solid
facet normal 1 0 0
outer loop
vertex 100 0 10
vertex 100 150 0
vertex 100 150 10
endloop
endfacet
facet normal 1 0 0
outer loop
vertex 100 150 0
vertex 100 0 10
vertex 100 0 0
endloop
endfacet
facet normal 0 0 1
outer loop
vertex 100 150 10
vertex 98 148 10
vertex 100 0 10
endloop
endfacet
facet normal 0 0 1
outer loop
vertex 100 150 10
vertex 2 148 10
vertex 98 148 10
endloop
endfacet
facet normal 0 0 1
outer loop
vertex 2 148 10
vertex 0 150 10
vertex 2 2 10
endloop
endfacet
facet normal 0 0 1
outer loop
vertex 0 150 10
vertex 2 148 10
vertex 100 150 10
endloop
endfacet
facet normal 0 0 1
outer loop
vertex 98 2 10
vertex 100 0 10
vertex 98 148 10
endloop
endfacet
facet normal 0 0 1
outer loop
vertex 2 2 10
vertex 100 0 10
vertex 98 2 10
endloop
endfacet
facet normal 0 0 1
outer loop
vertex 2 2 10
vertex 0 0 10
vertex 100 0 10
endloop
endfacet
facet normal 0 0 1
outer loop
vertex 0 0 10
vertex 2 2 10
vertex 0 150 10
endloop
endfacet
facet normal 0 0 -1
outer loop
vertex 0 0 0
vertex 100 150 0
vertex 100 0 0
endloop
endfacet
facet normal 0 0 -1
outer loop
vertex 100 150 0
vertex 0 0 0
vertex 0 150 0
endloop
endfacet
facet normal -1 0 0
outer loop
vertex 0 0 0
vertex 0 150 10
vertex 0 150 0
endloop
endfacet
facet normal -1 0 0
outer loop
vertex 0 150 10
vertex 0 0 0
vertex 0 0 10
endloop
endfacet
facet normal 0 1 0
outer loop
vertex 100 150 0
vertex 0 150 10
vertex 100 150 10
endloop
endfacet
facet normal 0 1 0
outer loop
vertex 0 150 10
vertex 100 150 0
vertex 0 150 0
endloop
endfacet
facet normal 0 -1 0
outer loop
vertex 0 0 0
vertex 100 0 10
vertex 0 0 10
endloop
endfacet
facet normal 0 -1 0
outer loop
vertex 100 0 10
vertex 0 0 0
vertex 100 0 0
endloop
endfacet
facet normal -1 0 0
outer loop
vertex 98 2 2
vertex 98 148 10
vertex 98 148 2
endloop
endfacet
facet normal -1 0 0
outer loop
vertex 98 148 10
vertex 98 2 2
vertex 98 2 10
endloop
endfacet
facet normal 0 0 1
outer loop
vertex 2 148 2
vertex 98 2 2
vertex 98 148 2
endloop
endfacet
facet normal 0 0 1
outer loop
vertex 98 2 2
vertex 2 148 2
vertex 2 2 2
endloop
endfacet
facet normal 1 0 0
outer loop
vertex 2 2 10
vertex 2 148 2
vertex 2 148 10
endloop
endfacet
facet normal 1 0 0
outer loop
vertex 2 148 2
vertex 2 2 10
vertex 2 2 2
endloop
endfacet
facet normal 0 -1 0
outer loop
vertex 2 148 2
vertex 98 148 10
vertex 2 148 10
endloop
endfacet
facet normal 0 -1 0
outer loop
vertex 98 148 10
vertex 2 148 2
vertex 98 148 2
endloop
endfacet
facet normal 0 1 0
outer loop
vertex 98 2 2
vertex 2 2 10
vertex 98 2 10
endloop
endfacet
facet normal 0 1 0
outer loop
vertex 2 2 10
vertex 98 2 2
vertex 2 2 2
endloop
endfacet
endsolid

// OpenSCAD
l = 100;
w = 150;
h = 10;
s = 2;


difference() {
    cube([l,w,h]);
    translate([s,s,s]) cube([l-2*s,w-2*s,h]);    
}
